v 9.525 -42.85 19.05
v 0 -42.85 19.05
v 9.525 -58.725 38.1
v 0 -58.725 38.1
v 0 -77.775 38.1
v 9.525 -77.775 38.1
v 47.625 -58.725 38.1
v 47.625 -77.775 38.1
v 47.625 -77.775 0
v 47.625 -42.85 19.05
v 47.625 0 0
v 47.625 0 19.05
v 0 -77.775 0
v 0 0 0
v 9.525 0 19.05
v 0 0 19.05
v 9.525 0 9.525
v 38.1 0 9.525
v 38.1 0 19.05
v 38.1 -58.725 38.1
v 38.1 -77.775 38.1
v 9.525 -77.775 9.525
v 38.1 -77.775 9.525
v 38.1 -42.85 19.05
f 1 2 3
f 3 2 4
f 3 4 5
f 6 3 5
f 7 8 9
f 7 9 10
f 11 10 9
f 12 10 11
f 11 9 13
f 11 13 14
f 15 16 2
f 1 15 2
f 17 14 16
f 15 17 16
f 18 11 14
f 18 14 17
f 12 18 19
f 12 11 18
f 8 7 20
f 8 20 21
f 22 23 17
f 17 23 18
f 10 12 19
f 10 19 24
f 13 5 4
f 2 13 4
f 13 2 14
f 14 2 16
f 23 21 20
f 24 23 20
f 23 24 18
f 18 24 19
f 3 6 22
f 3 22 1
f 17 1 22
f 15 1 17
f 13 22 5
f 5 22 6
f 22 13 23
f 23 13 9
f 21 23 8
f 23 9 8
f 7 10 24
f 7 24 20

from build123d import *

# Parameters (mm, degrees)
F0_W     = 77.7748
F0_H     = 9.525
F1_DEPTH = 23.8125
F2_DEPTH = 9.525


with BuildPart() as f1:
    # F0 (on Right) → F1 (new body)
    with BuildSketch(Plane.YZ):
        with Locations((-38.8874, 4.7625)):
            Rectangle(F0_W, F0_H)
    extrude(amount=F1_DEPTH)

    # F0 (on Right) → F2 (join)
    with BuildSketch(Plane.YZ):
        with Locations((-38.8874, 4.7625)):
            Rectangle(F0_W, F0_H)
        Polygon((-77.7748, 38.1), (-77.7748, 9.525), (0, 9.525), (0, 19.05), (-42.8498, 19.05), (-58.7248, 38.1), align=None)
    extrude(amount=F2_DEPTH)

    # F3: F1 across face


with BuildPart() as f1_1:
    add(f1.part)
    add(f1.part.mirror(Plane(origin=(23.8125, -38.8874, 4.7625), x_dir=(0, 1, 0), z_dir=(1, 0, 0))))


solid = f1_1.part
